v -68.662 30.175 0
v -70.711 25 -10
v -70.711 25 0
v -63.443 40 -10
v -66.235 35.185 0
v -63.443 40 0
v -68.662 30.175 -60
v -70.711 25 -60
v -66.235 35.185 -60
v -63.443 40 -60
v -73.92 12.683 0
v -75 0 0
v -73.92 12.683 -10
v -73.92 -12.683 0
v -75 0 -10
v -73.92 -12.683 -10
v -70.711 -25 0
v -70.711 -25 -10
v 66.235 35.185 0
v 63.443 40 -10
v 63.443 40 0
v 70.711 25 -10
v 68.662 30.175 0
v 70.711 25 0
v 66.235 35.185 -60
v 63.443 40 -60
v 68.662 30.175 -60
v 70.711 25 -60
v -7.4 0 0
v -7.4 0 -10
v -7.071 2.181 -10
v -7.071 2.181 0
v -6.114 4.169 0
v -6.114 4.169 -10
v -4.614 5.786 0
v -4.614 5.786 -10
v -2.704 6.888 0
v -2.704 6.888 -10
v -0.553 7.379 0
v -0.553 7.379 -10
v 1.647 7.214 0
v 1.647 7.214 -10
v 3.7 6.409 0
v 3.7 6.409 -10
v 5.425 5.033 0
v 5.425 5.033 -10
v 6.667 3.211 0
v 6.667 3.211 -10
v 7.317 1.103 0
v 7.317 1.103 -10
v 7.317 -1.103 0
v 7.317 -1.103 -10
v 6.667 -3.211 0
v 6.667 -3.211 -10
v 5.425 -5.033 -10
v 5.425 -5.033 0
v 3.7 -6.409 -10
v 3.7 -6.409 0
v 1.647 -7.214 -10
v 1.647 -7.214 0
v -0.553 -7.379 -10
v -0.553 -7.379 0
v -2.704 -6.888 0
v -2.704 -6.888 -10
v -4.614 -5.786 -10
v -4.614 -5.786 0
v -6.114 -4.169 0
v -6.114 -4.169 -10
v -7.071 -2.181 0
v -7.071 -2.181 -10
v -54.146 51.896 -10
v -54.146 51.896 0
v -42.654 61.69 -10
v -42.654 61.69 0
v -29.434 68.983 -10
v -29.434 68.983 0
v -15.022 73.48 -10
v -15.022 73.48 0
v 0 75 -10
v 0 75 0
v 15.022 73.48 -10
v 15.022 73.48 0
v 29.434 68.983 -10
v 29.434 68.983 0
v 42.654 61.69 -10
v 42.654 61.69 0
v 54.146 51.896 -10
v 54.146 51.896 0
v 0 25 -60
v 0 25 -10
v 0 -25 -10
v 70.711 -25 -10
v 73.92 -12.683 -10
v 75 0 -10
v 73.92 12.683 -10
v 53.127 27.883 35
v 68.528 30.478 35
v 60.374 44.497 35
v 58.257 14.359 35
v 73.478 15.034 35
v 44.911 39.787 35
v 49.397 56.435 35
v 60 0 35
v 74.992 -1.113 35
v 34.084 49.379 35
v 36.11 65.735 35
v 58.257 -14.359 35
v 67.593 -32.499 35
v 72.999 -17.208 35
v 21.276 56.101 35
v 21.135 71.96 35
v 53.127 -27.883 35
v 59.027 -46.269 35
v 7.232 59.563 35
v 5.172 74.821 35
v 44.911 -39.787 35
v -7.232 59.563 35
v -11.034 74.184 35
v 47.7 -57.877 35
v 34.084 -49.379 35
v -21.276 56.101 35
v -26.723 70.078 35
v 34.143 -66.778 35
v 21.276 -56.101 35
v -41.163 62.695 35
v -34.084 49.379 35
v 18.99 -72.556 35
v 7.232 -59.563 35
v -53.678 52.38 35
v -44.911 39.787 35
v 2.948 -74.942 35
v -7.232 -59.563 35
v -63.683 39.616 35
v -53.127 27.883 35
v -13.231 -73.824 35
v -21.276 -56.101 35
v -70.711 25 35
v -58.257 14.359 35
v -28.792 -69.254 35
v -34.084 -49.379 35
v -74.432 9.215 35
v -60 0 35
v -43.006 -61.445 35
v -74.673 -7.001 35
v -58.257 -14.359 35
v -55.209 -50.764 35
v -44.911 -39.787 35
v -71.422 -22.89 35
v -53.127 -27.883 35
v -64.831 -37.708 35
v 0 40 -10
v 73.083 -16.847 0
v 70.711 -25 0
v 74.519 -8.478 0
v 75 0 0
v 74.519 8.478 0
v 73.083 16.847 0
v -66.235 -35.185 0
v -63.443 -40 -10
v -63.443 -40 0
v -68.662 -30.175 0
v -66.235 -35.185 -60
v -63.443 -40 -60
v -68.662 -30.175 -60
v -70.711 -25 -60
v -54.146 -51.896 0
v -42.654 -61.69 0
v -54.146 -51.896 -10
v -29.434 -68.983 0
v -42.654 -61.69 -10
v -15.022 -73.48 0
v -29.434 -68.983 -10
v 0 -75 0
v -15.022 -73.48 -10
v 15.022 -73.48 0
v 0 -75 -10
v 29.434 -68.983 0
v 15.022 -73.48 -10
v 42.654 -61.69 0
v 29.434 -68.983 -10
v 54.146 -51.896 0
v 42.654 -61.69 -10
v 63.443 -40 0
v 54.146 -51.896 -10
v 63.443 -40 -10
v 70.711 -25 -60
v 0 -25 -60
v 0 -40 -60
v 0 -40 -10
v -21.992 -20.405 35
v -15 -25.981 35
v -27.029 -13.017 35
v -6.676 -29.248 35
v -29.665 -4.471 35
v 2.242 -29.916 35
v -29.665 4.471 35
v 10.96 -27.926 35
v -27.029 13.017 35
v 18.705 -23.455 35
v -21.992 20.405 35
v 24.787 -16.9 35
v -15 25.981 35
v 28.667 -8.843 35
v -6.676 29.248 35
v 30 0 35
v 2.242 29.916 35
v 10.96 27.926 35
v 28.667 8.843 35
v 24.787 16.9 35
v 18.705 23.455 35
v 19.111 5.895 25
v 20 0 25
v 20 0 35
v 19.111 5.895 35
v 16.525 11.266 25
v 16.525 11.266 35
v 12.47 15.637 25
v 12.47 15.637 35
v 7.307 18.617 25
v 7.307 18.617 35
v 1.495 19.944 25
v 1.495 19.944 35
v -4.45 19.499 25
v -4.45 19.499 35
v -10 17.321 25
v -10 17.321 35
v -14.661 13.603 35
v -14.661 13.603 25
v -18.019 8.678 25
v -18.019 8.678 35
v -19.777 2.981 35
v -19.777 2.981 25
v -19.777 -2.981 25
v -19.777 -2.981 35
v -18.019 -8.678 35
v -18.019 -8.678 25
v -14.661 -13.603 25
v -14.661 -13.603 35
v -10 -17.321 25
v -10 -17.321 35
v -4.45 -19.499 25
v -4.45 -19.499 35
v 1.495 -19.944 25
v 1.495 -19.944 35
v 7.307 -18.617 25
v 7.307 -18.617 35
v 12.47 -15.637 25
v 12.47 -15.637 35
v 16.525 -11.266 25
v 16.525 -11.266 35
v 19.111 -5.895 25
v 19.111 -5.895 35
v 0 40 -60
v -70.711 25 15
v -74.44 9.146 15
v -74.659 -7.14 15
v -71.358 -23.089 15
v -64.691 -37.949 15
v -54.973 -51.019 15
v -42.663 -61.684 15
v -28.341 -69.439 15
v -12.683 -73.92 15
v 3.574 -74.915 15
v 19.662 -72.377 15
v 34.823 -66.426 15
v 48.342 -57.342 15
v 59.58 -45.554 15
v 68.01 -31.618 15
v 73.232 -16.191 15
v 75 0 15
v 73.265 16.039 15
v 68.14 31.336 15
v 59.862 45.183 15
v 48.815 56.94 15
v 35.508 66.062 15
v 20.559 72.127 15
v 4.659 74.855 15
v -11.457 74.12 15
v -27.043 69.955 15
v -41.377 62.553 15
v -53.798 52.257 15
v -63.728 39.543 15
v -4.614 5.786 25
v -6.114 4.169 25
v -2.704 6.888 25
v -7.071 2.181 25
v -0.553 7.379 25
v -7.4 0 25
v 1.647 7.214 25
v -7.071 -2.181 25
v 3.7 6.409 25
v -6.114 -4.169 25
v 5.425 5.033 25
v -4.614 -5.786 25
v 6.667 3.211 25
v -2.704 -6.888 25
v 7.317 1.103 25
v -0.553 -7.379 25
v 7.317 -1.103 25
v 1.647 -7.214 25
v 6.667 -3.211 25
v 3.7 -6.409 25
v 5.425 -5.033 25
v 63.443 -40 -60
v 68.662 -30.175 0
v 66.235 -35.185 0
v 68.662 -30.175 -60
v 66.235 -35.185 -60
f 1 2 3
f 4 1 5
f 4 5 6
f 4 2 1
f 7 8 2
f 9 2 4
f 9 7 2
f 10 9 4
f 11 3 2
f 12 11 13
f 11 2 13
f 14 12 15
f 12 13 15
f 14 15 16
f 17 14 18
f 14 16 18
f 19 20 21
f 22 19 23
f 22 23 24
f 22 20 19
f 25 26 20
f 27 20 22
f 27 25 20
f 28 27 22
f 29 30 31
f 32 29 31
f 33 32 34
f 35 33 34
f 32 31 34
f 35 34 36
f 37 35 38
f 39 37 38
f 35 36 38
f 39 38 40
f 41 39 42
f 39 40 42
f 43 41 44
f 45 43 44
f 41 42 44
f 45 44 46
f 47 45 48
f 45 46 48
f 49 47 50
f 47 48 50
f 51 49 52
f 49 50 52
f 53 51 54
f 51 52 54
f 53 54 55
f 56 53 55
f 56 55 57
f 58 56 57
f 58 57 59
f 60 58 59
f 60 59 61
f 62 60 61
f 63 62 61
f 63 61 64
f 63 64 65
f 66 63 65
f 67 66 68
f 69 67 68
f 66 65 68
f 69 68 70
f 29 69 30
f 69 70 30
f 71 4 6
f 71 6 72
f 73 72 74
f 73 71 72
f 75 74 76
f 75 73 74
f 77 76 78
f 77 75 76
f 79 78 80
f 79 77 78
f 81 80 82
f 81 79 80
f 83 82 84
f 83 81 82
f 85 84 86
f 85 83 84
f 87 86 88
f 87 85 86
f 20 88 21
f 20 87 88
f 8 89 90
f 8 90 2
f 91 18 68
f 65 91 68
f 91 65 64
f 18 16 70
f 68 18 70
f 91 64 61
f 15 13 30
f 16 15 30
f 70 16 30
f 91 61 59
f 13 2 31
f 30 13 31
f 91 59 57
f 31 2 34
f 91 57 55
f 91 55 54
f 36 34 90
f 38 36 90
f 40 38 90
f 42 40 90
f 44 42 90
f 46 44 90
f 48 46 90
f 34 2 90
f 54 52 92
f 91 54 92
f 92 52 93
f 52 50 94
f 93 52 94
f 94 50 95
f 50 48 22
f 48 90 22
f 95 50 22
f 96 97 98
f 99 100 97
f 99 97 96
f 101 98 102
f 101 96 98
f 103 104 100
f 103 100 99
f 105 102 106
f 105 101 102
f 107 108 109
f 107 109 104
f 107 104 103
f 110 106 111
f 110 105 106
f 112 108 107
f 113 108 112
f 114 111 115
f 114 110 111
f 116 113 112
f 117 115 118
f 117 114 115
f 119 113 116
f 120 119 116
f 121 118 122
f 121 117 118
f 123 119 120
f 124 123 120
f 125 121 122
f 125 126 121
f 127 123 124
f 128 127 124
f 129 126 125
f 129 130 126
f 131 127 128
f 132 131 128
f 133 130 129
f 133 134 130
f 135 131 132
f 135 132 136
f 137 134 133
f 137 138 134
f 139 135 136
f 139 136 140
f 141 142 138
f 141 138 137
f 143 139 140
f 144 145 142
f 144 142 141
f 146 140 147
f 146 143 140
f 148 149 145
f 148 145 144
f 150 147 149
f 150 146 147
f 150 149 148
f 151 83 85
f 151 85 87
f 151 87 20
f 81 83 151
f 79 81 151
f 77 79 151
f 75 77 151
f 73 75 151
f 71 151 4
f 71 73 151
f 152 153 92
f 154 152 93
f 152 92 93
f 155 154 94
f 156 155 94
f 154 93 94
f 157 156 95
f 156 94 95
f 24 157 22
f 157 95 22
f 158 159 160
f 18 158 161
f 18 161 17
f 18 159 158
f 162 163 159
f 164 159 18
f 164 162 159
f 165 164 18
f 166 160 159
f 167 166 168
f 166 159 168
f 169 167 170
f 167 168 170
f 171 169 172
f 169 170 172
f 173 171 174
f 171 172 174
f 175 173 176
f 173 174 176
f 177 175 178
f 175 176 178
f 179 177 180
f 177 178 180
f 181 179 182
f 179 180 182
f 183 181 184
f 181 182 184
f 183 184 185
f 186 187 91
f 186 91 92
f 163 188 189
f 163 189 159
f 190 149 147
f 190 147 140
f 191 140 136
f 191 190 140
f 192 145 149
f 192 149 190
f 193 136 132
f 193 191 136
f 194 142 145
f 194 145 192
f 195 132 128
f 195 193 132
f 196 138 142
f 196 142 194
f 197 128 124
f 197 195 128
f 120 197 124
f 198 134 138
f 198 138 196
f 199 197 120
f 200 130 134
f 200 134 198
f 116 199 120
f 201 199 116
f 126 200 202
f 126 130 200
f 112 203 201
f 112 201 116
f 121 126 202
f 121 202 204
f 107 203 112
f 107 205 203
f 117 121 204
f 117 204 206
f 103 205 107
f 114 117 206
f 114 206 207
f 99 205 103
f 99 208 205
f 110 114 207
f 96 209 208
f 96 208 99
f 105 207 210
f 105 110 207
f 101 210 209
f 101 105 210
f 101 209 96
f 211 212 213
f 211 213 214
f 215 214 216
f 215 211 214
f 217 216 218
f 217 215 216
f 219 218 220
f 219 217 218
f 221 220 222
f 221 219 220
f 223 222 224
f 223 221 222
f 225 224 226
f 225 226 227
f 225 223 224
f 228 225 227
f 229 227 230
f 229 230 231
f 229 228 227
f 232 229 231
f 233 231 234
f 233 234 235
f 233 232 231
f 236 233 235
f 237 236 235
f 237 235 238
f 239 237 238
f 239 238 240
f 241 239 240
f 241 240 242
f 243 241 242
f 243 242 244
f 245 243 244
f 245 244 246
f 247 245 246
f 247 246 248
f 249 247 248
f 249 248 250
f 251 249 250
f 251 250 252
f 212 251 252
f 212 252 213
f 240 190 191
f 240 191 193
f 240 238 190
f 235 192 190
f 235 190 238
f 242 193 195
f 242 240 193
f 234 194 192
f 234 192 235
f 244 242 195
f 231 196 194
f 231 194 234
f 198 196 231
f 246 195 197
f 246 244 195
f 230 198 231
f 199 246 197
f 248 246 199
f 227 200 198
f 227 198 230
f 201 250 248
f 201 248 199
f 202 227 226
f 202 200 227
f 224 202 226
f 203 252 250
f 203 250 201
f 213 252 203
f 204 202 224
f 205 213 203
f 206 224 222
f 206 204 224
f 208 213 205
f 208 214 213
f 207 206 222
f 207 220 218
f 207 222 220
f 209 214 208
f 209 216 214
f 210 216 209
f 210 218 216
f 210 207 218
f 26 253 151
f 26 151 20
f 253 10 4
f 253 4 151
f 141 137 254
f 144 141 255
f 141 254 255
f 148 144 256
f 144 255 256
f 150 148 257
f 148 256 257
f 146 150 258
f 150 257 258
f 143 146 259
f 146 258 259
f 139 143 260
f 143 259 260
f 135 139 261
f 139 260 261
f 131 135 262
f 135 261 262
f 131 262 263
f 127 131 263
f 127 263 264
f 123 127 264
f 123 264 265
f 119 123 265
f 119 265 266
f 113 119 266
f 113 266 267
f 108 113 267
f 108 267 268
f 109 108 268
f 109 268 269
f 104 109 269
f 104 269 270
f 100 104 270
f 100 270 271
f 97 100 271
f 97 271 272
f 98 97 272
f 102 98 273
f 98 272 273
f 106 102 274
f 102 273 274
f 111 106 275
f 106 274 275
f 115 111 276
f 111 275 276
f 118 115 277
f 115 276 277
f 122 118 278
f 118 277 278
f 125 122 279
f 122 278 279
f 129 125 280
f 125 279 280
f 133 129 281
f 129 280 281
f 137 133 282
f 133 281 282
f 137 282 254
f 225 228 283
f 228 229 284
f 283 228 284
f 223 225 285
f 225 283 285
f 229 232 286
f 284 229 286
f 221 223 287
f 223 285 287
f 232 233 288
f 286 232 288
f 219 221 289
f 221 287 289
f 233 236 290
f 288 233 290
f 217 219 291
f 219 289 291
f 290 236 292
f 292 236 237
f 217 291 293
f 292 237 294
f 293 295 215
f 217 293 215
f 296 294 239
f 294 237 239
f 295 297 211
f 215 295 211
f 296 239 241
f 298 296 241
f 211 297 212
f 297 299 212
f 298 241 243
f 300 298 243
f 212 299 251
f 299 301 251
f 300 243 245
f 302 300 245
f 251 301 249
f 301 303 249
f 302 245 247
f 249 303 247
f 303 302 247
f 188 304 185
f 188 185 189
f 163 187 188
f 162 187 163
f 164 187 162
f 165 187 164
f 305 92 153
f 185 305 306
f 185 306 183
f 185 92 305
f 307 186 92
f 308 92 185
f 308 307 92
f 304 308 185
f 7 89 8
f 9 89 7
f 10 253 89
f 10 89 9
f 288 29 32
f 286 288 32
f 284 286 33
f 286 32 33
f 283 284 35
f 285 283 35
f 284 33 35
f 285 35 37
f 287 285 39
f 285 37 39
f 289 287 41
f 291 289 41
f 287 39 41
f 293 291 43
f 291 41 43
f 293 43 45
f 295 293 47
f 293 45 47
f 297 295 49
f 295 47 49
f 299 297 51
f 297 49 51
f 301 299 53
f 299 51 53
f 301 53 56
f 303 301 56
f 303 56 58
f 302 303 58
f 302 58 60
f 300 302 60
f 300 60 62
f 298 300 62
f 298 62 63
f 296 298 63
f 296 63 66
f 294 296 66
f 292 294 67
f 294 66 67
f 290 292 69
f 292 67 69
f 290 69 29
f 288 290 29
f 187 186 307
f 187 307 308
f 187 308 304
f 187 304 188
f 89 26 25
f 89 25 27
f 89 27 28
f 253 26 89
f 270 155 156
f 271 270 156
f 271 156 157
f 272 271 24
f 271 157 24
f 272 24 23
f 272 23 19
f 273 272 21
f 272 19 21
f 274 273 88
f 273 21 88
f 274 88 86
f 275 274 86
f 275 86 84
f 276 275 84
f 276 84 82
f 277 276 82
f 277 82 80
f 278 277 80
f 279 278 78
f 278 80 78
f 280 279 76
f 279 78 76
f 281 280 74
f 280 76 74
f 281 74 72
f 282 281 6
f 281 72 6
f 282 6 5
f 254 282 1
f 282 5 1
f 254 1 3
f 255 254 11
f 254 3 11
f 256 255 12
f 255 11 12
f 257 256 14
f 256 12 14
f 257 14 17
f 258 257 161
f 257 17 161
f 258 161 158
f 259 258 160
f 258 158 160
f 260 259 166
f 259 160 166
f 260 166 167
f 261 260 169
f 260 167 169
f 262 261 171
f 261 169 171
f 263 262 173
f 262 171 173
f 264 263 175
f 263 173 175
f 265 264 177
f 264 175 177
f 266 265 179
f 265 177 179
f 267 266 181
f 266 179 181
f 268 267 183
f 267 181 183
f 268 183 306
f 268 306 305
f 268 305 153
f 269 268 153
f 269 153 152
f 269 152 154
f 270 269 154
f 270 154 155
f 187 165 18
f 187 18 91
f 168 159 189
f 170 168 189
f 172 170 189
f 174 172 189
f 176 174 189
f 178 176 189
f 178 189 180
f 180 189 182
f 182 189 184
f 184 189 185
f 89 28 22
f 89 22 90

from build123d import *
from build123d.topology import SkipClean

# Parameters (mm, degrees)
CROQUIS1_R              = 75
SALIENTE_EXTRUIR1_DEPTH = 15
SALIENTE_EXTRUIR2_START = 60
SALIENTE_EXTRUIR2_DEPTH = 60
CROQUIS3_R              = 75
CROQUIS3_R_2            = 60
SALIENTE_EXTRUIR3_DEPTH = 20
CROQUIS4_R              = 25
CORTAR_EXTRUIR1_DEPTH   = 20
SALIENTE_EXTRUIR4_START = -30
CROQUIS5_R              = 60
CROQUIS5_R_2            = 30
SALIENTE_EXTRUIR4_DEPTH = 30
CROQUIS6_R              = 30
CROQUIS6_R_2            = 25
SALIENTE_EXTRUIR5_DEPTH = 10
SALIENTE_EXTRUIR6_START = -35
CROQUIS7_R              = 30
CROQUIS7_R_2            = 20
SALIENTE_EXTRUIR6_DEPTH = 35
CROQUIS8_R              = 20
CROQUIS8_R_2            = 7.4
SALIENTE_EXTRUIR7_DEPTH = 25
SALIENTE_EXTRUIR9_START = 10
CROQUIS9_R              = 7.400002037
SALIENTE_EXTRUIR9_DEPTH = 10


with BuildPart() as part:
    # Croquis1 → Saliente-Extruir1 (new body)
    with BuildSketch(Plane.XY):
        Circle(CROQUIS1_R)
    extrude(amount=SALIENTE_EXTRUIR1_DEPTH)

    # Croquis2 → Saliente-Extruir2 (add)
    with SkipClean():  # the faces are left unmerged after this step: merging them gives an invalid solid
        with BuildSketch(Plane(origin=(0, 0, 0), x_dir=(-1, 0, 0), z_dir=(0, 0, -1)).offset(SALIENTE_EXTRUIR2_START)):
            with BuildLine():
                Line((-70.710678119, 25), (0, 25))
                Line((0, 25), (0, 40))
                Line((0, 40), (-63.442887702, 40))
                ThreePointArc((-63.442887702, 40), (-67.494776136, 32.70252581), (-70.710678119, 25))
            make_face()
            with BuildLine():
                Line((0, 40), (0, 25))
                Line((0, 25), (70.710678119, 25))
                ThreePointArc((70.710678119, 25), (67.494776136, 32.70252581), (63.442887702, 40))
                Line((63.442887702, 40), (0, 40))
            make_face()
            with BuildLine():
                Line((-70.710678119, 25), (0, 25))
                Line((0, 25), (0, 40))
                Line((0, 40), (-63.442887702, 40))
                ThreePointArc((-63.442887702, 40), (-67.494776136, 32.70252581), (-70.710678119, 25))
            make_face()
            with BuildLine():
                Line((0, -40), (0, -25))
                Line((0, -25), (-70.710678119, -25))
                ThreePointArc((-70.710678119, -25), (-67.494776136, -32.70252581), (-63.442887702, -40))
                Line((-63.442887702, -40), (0, -40))
            make_face()
            with BuildLine():
                Line((70.710678119, -25), (0, -25))
                Line((0, -25), (0, -40))
                Line((0, -40), (63.442887702, -40))
                ThreePointArc((63.442887702, -40), (67.494776136, -32.70252581), (70.710678119, -25))
            make_face()
            with BuildLine():
                Line((0, -40), (0, -25))
                Line((0, -25), (-70.710678119, -25))
                ThreePointArc((-70.710678119, -25), (-67.494776136, -32.70252581), (-63.442887702, -40))
                Line((-63.442887702, -40), (0, -40))
            make_face()
            with BuildLine():
                Line((70.710678119, -25), (0, -25))
                Line((0, -25), (0, -40))
                Line((0, -40), (63.442887702, -40))
                ThreePointArc((63.442887702, -40), (67.494776136, -32.70252581), (70.710678119, -25))
            make_face()
        extrude(amount=-SALIENTE_EXTRUIR2_DEPTH)

    # Croquis3 → Saliente-Extruir3 (add)
    with SkipClean():  # the faces are left unmerged after this step: merging them gives an invalid solid
        with BuildSketch(Plane.XY.offset(15)):
            with Locations(Location((0, 0, 0), (0, 0, 160.528779366))):
                Circle(CROQUIS3_R)
            Circle(CROQUIS3_R_2, mode=Mode.SUBTRACT)
        extrude(amount=SALIENTE_EXTRUIR3_DEPTH)

    # Croquis4 → Cortar-Extruir1 (cut)
    with SkipClean():  # the faces are left unmerged after this step: merging them gives an invalid solid
        with BuildSketch(Plane.XY.offset(15)):
            Circle(CROQUIS4_R)
        extrude(amount=-CORTAR_EXTRUIR1_DEPTH, mode=Mode.SUBTRACT)

    # Croquis5 → Saliente-Extruir4 (add)
    with SkipClean():  # the faces are left unmerged after this step: merging them gives an invalid solid
        with BuildSketch(Plane.XY.offset(35).offset(SALIENTE_EXTRUIR4_START)):
            Circle(CROQUIS5_R)
            Circle(CROQUIS5_R_2, mode=Mode.SUBTRACT)
        extrude(amount=SALIENTE_EXTRUIR4_DEPTH)

    # Croquis6 → Saliente-Extruir5 (add)
    with SkipClean():  # the faces are left unmerged after this step: merging them gives an invalid solid
        with BuildSketch(Plane.XY.offset(15)):
            Circle(CROQUIS6_R)
            Circle(CROQUIS6_R_2, mode=Mode.SUBTRACT)
        extrude(amount=SALIENTE_EXTRUIR5_DEPTH)

    # Croquis7 → Saliente-Extruir6 (add)
    with SkipClean():  # the faces are left unmerged after this step: merging them gives an invalid solid
        with BuildSketch(Plane.XY.offset(35).offset(SALIENTE_EXTRUIR6_START)):
            Circle(CROQUIS7_R)
            Circle(CROQUIS7_R_2, mode=Mode.SUBTRACT)
        extrude(amount=SALIENTE_EXTRUIR6_DEPTH)

    # Croquis8 → Saliente-Extruir7 (add)
    with SkipClean():  # the faces are left unmerged after this step: merging them gives an invalid solid
        with BuildSketch(Plane(origin=(0, 0, 0), x_dir=(-1, 0, 0), z_dir=(0, 0, -1))):
            with Locations(Location((0, 0, 0), (0, 0, 180))):
                Circle(CROQUIS8_R)
            Circle(CROQUIS8_R_2, mode=Mode.SUBTRACT)
        extrude(amount=-SALIENTE_EXTRUIR7_DEPTH)

    # Croquis9 → Saliente-Extruir9 (add)
    # profile 1 of 3: a face of its own
    with SkipClean():  # the faces are left unmerged after this step: merging them gives an invalid solid
        with BuildSketch(Plane(origin=(0, 0, 0), x_dir=(-1, 0, 0), z_dir=(0, 0, -1)).offset(SALIENTE_EXTRUIR9_START)):
            with BuildLine():
                Line((-63.442887702, 40), (63.442887702, 40))
                ThreePointArc((63.442887702, 40), (0, 75), (-63.442887702, 40))
            make_face()
        # profile 2 of 3: a face of its own
        with BuildSketch(Plane(origin=(0, 0, 0), x_dir=(-1, 0, 0), z_dir=(0, 0, -1)).offset(SALIENTE_EXTRUIR9_START)):
            with BuildLine():
                Line((-70.710678119, 25), (70.710678119, 25))
                ThreePointArc((70.710678119, 25), (74.999999766, 0), (70.710678119, -25))
                Line((70.710678119, -25), (-70.710678119, -25))
                ThreePointArc((-70.710678119, -25), (-75, 0), (-70.710678119, 25))
            make_face()
            with Locations((-4.084e-06, 0)):
                Circle(CROQUIS9_R, mode=Mode.SUBTRACT)
        # profile 3 of 3: a face of its own
        with BuildSketch(Plane(origin=(0, 0, 0), x_dir=(-1, 0, 0), z_dir=(0, 0, -1)).offset(SALIENTE_EXTRUIR9_START)):
            with BuildLine():
                Line((-63.442887702, -40), (63.442887702, -40))
                ThreePointArc((63.442887702, -40), (0, -75), (-63.442887702, -40))
            make_face()
        extrude(amount=-SALIENTE_EXTRUIR9_DEPTH)


solid = part.part
